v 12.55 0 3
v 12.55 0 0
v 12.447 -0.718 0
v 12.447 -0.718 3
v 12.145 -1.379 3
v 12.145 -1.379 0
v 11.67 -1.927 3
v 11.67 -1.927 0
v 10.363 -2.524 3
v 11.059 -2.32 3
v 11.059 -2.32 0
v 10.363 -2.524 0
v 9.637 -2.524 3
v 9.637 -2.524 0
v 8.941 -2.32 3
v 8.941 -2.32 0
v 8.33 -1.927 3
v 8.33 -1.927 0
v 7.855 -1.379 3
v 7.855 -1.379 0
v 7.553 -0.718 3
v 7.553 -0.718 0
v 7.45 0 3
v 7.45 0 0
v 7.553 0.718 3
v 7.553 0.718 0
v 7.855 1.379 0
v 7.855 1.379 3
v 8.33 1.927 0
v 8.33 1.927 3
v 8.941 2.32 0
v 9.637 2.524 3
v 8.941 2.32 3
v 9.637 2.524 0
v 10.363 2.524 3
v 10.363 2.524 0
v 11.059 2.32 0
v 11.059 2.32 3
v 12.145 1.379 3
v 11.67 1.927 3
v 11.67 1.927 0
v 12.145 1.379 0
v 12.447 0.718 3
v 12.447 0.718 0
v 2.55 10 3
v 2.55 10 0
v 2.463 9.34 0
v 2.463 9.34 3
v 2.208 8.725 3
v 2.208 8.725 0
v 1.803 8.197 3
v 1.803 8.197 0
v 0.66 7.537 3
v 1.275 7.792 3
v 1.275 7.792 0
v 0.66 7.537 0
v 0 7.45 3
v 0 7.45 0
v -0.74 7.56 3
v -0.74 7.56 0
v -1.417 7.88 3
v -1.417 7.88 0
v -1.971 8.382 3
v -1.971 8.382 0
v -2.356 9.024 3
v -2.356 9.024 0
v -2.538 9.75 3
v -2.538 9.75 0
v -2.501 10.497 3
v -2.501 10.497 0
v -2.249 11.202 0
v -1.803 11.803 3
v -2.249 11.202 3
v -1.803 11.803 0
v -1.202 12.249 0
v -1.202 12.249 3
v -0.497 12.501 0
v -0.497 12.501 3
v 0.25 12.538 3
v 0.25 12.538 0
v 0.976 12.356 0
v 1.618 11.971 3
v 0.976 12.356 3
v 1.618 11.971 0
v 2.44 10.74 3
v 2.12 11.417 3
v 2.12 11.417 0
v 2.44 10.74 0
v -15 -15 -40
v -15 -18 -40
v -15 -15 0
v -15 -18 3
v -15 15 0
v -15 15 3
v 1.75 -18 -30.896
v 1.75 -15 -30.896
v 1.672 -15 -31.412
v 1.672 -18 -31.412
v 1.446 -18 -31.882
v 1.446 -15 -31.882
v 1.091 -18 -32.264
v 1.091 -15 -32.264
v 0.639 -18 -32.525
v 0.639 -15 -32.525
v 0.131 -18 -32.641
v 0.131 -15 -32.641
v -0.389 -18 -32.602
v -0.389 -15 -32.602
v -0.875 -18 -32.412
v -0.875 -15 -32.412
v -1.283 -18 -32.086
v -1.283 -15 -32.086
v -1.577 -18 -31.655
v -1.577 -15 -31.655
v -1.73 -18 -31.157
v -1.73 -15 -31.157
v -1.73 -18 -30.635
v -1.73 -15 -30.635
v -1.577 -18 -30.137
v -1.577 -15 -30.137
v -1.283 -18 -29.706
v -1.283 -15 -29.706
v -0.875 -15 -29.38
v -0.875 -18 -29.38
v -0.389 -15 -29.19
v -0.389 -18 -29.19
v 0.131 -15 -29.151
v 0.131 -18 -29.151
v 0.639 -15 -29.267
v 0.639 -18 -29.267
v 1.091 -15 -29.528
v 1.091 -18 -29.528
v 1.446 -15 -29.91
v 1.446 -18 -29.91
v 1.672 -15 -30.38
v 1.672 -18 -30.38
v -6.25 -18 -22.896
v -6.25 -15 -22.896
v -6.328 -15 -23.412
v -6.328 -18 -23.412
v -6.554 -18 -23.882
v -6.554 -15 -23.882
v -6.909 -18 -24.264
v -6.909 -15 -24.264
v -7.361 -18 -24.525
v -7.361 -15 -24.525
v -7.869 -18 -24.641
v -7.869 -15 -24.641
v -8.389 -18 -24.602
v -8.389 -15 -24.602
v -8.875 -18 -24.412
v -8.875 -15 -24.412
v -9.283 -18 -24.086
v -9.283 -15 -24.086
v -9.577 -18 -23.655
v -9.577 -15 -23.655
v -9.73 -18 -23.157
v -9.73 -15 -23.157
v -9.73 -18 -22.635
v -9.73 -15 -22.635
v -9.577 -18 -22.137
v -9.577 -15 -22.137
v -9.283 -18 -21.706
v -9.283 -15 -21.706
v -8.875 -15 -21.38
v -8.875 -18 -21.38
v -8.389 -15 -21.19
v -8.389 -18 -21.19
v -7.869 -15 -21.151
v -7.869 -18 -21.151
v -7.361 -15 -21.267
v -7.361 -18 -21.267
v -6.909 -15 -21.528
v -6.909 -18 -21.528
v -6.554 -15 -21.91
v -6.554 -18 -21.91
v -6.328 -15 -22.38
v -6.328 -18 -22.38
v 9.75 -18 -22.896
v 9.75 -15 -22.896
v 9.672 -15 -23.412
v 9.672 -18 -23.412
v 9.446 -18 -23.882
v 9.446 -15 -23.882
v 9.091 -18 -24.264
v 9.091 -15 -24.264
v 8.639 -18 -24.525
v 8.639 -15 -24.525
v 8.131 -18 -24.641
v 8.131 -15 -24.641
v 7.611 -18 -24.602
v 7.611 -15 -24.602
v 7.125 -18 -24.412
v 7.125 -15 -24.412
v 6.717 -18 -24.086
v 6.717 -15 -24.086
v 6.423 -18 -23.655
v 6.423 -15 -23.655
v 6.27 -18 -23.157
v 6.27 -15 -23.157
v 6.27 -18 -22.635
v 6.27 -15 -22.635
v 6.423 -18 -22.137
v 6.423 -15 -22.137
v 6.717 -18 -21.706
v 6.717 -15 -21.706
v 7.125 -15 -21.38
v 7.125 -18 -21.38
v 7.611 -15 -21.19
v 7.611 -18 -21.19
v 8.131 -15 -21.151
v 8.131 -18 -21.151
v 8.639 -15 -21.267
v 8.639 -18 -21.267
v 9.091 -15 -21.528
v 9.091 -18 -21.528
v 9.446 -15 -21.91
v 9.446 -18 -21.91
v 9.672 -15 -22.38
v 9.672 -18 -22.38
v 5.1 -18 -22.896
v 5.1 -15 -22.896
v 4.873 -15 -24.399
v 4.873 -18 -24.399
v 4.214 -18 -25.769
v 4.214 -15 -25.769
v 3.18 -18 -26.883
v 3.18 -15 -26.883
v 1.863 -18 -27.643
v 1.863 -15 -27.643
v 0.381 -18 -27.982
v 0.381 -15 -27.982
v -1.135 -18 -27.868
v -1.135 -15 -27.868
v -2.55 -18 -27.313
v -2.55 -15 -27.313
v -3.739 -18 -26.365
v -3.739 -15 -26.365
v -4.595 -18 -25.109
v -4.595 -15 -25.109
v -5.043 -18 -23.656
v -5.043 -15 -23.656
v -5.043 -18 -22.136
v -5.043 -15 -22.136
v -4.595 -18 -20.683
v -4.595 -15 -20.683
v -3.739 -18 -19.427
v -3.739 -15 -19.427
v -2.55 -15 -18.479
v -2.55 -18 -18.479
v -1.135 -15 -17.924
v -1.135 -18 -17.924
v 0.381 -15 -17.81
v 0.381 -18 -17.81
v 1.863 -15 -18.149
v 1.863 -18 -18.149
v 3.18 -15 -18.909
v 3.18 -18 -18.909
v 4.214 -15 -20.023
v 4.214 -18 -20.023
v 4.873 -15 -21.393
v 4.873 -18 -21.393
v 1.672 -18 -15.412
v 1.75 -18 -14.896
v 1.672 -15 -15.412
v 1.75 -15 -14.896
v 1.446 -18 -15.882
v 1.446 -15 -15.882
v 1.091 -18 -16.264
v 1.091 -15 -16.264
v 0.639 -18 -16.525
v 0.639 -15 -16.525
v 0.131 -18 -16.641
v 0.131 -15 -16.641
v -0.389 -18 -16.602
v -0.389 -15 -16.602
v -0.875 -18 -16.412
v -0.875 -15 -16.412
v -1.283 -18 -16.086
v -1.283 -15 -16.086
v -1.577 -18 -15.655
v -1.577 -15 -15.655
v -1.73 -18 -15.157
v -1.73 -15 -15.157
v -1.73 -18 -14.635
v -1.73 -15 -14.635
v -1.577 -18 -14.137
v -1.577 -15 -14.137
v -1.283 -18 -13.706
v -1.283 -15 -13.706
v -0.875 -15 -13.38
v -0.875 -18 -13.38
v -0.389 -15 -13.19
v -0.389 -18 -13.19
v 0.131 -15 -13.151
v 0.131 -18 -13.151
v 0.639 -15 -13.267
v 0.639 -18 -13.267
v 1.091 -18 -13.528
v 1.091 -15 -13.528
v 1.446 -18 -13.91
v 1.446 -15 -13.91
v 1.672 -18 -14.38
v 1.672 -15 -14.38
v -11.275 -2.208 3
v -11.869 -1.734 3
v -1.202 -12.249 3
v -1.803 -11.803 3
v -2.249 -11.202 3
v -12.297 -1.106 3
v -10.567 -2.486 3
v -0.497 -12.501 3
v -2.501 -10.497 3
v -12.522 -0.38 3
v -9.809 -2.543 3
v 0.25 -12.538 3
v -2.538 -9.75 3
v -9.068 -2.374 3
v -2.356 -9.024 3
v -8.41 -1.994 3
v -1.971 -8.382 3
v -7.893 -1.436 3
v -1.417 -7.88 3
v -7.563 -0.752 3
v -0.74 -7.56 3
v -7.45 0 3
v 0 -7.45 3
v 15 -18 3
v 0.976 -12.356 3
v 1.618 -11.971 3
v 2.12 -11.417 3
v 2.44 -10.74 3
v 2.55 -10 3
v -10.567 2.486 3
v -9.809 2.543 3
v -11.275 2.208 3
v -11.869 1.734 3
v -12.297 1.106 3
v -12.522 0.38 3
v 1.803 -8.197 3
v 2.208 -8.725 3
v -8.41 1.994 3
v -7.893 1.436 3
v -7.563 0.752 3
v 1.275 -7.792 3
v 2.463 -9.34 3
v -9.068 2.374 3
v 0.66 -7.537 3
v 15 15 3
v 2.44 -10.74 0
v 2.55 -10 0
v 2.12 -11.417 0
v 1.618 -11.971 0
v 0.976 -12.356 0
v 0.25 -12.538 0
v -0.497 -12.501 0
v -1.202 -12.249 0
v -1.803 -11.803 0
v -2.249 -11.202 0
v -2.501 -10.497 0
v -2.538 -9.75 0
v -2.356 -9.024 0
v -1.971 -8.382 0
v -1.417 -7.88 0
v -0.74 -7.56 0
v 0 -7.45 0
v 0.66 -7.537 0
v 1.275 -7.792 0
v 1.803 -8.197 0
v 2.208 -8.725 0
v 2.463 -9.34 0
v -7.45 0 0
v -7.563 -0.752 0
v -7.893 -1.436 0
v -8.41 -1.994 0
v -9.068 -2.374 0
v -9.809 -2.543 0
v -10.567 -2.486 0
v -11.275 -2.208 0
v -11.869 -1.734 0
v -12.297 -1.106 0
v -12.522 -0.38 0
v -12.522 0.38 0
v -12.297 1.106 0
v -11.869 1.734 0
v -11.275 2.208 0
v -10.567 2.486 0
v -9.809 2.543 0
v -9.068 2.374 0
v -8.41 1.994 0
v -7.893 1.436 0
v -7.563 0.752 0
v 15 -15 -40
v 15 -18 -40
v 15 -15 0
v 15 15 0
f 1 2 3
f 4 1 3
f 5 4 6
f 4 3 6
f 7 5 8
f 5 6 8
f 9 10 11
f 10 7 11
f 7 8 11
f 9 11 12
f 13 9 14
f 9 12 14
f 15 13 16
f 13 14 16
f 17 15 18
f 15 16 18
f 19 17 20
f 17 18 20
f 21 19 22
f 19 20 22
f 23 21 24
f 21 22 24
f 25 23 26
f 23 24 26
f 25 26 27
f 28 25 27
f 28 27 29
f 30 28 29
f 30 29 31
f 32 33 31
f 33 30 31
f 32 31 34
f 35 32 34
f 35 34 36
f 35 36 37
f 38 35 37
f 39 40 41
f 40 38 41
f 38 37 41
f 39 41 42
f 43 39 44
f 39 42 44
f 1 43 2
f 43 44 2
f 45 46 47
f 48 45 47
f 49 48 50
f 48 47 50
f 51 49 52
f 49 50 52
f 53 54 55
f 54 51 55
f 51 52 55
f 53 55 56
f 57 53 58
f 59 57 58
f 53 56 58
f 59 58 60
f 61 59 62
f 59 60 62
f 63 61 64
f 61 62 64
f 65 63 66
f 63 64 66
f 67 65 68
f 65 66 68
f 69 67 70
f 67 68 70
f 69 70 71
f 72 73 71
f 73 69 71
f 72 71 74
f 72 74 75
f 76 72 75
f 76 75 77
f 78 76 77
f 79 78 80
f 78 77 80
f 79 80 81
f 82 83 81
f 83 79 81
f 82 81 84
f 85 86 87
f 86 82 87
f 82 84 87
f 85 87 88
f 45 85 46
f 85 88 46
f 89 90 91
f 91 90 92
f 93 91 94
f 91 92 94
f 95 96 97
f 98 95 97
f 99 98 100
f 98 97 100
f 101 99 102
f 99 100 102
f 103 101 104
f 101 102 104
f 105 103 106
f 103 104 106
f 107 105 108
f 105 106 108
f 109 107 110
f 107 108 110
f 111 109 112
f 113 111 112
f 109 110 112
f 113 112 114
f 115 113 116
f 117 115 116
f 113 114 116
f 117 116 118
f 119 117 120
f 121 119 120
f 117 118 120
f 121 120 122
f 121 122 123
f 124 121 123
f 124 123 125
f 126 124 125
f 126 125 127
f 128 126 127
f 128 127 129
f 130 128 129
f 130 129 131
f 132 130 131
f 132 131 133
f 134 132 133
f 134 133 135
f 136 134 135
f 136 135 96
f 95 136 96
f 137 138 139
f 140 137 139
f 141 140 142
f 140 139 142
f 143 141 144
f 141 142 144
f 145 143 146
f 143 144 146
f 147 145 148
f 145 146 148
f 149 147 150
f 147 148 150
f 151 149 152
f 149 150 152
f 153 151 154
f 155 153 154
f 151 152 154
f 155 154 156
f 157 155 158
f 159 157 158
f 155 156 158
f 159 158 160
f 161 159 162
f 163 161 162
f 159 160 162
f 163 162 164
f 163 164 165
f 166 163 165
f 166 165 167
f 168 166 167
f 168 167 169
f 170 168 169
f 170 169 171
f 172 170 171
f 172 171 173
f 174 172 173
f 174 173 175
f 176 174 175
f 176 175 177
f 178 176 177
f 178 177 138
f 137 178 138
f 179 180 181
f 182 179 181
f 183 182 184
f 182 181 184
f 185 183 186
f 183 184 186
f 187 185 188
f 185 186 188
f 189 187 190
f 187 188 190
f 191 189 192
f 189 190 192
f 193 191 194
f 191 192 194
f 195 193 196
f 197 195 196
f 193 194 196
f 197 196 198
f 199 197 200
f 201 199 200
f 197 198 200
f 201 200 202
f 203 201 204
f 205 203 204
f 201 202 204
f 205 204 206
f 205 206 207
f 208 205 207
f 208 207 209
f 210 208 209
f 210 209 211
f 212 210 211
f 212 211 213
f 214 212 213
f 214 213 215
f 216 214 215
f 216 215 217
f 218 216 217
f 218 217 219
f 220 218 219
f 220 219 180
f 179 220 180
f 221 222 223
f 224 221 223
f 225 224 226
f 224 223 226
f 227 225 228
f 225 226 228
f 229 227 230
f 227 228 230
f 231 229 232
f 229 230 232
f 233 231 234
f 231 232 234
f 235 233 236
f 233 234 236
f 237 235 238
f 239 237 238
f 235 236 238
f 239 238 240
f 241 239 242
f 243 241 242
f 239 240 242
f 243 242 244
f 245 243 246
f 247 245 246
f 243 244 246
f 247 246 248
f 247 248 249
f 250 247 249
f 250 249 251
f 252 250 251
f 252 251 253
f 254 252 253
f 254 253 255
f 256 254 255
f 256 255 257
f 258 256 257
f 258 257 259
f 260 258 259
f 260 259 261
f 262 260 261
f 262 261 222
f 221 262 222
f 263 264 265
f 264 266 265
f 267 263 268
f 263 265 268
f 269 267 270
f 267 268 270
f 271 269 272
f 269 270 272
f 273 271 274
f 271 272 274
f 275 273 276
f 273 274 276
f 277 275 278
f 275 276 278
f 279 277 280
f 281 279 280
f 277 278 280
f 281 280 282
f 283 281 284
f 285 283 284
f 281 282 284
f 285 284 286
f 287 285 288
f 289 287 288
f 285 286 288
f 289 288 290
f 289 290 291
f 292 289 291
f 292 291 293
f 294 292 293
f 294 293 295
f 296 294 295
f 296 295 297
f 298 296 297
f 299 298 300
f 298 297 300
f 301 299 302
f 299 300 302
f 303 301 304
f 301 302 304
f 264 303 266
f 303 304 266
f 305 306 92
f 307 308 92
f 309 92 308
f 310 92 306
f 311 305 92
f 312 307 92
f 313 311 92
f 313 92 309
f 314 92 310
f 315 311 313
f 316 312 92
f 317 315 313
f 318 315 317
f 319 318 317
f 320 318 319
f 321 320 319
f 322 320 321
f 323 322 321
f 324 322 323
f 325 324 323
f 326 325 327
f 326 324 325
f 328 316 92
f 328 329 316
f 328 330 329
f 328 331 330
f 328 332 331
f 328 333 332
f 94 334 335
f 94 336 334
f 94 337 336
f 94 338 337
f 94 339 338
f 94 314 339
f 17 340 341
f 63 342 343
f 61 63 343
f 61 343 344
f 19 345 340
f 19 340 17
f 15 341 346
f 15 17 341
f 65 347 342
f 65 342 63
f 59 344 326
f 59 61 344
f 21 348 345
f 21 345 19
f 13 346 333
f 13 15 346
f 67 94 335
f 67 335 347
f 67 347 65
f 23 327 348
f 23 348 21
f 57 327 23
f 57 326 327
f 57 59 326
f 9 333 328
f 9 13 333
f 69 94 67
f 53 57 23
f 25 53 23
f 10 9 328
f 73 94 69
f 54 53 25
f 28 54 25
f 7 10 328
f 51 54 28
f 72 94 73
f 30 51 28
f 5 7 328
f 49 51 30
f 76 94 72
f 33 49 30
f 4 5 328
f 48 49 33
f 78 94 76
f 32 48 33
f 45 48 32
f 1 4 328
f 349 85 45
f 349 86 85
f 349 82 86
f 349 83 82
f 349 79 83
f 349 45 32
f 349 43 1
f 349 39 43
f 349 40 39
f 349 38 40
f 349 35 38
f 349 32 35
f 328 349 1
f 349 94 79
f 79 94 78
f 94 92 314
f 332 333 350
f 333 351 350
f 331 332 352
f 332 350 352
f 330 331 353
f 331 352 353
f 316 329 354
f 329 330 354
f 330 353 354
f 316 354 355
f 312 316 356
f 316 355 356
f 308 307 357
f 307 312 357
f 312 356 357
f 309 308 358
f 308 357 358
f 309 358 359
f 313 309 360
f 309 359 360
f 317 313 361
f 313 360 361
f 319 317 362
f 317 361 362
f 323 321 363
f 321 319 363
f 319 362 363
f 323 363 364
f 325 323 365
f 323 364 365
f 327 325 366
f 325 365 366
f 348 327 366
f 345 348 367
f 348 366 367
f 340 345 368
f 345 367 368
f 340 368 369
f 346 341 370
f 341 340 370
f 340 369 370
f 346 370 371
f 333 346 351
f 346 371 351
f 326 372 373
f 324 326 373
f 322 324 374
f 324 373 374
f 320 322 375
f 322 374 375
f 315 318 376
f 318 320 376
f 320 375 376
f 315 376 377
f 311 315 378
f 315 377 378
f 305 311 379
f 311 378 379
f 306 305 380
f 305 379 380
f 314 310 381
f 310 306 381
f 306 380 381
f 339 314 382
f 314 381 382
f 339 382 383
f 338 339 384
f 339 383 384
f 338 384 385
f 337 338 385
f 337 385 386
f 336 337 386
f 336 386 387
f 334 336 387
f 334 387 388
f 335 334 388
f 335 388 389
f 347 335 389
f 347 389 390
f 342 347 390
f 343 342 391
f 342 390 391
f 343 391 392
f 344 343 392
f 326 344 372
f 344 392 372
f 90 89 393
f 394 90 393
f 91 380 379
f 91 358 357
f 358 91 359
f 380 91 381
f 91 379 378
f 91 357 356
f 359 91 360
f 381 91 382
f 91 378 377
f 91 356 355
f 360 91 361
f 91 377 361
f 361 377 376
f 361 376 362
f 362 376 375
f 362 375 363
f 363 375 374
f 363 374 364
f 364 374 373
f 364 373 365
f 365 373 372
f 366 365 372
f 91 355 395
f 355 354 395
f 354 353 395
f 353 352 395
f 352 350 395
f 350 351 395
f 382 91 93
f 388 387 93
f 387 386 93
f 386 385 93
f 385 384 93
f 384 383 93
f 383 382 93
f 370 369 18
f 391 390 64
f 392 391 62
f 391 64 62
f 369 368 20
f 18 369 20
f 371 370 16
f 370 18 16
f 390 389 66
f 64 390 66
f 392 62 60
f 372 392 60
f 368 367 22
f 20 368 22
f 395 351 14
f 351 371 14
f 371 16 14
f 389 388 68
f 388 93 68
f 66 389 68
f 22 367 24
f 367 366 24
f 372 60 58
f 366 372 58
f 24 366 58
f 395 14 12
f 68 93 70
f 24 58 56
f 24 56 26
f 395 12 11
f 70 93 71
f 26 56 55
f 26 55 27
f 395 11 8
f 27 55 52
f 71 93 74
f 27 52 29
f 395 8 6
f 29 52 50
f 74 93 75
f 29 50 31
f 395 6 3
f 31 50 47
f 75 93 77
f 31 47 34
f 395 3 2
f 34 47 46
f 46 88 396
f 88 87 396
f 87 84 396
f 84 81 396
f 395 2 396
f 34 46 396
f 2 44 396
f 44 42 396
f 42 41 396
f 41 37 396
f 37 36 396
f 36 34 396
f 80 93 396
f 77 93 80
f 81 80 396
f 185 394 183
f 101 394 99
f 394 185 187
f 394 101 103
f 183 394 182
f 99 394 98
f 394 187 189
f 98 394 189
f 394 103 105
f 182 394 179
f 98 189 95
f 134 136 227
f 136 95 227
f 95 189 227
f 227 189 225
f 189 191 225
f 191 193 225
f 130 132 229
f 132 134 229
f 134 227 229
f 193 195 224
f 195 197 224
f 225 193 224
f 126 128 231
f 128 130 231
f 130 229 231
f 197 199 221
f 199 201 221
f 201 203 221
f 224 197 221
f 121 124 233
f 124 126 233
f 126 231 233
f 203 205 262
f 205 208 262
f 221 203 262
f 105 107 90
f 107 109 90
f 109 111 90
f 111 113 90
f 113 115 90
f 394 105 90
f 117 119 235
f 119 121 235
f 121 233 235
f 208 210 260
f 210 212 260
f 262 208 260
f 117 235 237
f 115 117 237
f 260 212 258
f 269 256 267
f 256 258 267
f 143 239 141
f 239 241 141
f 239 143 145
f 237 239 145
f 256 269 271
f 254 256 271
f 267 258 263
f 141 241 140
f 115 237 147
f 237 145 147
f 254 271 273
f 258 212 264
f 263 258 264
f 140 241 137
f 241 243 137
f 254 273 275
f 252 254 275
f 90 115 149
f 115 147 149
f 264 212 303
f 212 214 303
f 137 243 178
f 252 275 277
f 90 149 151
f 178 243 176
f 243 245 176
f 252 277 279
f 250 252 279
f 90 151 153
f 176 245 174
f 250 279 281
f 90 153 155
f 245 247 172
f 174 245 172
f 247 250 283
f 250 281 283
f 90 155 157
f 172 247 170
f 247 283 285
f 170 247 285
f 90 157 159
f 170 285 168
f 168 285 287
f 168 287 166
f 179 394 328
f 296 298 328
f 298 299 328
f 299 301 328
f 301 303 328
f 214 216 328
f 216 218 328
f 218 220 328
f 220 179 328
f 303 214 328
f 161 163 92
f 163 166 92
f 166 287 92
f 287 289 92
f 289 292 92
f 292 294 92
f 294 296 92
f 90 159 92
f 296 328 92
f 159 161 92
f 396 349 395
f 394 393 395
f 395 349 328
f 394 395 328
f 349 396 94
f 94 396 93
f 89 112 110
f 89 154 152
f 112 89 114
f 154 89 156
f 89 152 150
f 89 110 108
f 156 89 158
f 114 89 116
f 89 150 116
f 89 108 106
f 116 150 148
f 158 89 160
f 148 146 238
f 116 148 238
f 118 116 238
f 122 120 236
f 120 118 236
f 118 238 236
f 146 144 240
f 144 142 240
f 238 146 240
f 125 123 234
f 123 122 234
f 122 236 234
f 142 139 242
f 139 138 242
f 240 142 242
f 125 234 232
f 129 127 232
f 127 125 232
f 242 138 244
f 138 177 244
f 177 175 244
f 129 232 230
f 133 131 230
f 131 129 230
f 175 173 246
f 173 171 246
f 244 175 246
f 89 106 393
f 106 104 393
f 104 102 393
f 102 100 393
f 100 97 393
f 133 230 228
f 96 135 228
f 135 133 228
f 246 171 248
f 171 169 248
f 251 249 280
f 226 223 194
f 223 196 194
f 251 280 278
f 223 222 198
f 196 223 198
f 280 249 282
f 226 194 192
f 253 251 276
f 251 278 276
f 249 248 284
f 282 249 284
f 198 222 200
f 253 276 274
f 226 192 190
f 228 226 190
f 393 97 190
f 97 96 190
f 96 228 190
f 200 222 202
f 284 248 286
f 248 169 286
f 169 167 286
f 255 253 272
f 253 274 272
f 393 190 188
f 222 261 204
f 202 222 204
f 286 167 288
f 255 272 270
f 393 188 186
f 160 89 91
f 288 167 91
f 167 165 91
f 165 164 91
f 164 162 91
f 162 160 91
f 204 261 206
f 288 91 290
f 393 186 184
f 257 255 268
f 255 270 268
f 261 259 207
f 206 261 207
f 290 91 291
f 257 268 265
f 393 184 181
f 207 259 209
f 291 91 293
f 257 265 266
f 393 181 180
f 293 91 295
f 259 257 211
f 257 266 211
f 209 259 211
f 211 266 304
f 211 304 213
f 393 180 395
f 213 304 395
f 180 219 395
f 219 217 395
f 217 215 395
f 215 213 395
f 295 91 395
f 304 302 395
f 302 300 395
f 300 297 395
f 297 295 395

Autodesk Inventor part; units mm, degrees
ref_plane "YZ Plane" through (0, 0, 0) normal (1, 0, 0) x (0, 1, 0)
ref_plane "XZ Plane" through (0, 0, 0) normal (0, 1, 0) x (-1, 0, 0)
ref_plane "XY Plane" through (0, 0, 0) normal (0, 0, 1) x (1, 0, 0)
sketch "Sketch1" plane through (0, 0, 0) normal (0, 0, 1) x (1, 0, 0)
  line L0 (-15, -15) -> (15, -15)
  line L1 (15, -15) -> (15, 15)
  line L2 (15, 15) -> (-15, 15)
  line L3 (-15, 15) -> (-15, -15)
  line L4 (-15, -15) -> (15, 15) construction
  line L5 (15, -15) -> (-15, 15) construction
  line L6 (0, -10) -> (0, 10)
  line L7 (-10, 0) -> (10, 0)
  circle A0 centre (-10, 0) radius 2.55
  circle A1 centre (0, 10) radius 2.55
  circle A2 centre (10, 0) radius 2.55
  circle A3 centre (0, -10) radius 2.55
  line L8 (-15, -15) -> (15, -15)
  line L9 (15, -15) -> (15, -18)
  line L10 (15, -18) -> (-15, -18)
  line L11 (-15, -18) -> (-15, -15)
  point P0 (0, 0)
  dimension "d0" = 30
  dimension "d1" = 30
  dimension "d2" = 20
  dimension "d3" = 20
  dimension "d4" = 5.1
  dimension "d5" = 5.1
  dimension "d6" = 5.1
  dimension "d7" = 5.1
  dimension "d8" = 3
extrude "Extrusion1" add sketch "Sketch1" along normal blind 3
extrude "Extrusion2" add sketch "Sketch1" against normal blind 40 contours L0 L9 L10 L11
sketch "Sketch2" plane through (-15, -15, 0) normal (0, 1, 0) x (1, 0, 0)
  line L0 (0, 0) -> (0, -3) projected
  line L1 (30, 0) -> (30, 40) projected
  line L2 (0, 0) -> (30, 0)
  line L3 (30, 0) -> (15, 0)
  line L4 (15, 0) -> (15, 22.896)
  circle A0 centre (15, 22.896) radius 5.1
  circle A1 centre (15, 22.896) radius 8
  circle A2 centre (15, 14.896) radius 1.75
  circle A3 centre (23, 22.896) radius 1.75
  circle A4 centre (15, 30.896) radius 1.75
  circle A5 centre (7, 22.896) radius 1.75
  point P0 (13.2605, 30.7046)
  point P1 (16.7395, 30.7046)
  dimension "d15" = 16
  dimension "d13" = 22.896
  dimension "d14" = 10.2
  dimension "d16" = 3.5
  dimension "d19" = 360
extrude "Extrusion3" cut sketch "Sketch2" against normal blind 40 contours A2 A1 L4 | L4 A1 A2 | A1 A2 L4 | L4 A2 A1 | A0 | A5 A1 | A1 A5 | A3 A1 | A1 A3 | A4 A1 | A1 A4
properties part number "Leadnut Attachment"
